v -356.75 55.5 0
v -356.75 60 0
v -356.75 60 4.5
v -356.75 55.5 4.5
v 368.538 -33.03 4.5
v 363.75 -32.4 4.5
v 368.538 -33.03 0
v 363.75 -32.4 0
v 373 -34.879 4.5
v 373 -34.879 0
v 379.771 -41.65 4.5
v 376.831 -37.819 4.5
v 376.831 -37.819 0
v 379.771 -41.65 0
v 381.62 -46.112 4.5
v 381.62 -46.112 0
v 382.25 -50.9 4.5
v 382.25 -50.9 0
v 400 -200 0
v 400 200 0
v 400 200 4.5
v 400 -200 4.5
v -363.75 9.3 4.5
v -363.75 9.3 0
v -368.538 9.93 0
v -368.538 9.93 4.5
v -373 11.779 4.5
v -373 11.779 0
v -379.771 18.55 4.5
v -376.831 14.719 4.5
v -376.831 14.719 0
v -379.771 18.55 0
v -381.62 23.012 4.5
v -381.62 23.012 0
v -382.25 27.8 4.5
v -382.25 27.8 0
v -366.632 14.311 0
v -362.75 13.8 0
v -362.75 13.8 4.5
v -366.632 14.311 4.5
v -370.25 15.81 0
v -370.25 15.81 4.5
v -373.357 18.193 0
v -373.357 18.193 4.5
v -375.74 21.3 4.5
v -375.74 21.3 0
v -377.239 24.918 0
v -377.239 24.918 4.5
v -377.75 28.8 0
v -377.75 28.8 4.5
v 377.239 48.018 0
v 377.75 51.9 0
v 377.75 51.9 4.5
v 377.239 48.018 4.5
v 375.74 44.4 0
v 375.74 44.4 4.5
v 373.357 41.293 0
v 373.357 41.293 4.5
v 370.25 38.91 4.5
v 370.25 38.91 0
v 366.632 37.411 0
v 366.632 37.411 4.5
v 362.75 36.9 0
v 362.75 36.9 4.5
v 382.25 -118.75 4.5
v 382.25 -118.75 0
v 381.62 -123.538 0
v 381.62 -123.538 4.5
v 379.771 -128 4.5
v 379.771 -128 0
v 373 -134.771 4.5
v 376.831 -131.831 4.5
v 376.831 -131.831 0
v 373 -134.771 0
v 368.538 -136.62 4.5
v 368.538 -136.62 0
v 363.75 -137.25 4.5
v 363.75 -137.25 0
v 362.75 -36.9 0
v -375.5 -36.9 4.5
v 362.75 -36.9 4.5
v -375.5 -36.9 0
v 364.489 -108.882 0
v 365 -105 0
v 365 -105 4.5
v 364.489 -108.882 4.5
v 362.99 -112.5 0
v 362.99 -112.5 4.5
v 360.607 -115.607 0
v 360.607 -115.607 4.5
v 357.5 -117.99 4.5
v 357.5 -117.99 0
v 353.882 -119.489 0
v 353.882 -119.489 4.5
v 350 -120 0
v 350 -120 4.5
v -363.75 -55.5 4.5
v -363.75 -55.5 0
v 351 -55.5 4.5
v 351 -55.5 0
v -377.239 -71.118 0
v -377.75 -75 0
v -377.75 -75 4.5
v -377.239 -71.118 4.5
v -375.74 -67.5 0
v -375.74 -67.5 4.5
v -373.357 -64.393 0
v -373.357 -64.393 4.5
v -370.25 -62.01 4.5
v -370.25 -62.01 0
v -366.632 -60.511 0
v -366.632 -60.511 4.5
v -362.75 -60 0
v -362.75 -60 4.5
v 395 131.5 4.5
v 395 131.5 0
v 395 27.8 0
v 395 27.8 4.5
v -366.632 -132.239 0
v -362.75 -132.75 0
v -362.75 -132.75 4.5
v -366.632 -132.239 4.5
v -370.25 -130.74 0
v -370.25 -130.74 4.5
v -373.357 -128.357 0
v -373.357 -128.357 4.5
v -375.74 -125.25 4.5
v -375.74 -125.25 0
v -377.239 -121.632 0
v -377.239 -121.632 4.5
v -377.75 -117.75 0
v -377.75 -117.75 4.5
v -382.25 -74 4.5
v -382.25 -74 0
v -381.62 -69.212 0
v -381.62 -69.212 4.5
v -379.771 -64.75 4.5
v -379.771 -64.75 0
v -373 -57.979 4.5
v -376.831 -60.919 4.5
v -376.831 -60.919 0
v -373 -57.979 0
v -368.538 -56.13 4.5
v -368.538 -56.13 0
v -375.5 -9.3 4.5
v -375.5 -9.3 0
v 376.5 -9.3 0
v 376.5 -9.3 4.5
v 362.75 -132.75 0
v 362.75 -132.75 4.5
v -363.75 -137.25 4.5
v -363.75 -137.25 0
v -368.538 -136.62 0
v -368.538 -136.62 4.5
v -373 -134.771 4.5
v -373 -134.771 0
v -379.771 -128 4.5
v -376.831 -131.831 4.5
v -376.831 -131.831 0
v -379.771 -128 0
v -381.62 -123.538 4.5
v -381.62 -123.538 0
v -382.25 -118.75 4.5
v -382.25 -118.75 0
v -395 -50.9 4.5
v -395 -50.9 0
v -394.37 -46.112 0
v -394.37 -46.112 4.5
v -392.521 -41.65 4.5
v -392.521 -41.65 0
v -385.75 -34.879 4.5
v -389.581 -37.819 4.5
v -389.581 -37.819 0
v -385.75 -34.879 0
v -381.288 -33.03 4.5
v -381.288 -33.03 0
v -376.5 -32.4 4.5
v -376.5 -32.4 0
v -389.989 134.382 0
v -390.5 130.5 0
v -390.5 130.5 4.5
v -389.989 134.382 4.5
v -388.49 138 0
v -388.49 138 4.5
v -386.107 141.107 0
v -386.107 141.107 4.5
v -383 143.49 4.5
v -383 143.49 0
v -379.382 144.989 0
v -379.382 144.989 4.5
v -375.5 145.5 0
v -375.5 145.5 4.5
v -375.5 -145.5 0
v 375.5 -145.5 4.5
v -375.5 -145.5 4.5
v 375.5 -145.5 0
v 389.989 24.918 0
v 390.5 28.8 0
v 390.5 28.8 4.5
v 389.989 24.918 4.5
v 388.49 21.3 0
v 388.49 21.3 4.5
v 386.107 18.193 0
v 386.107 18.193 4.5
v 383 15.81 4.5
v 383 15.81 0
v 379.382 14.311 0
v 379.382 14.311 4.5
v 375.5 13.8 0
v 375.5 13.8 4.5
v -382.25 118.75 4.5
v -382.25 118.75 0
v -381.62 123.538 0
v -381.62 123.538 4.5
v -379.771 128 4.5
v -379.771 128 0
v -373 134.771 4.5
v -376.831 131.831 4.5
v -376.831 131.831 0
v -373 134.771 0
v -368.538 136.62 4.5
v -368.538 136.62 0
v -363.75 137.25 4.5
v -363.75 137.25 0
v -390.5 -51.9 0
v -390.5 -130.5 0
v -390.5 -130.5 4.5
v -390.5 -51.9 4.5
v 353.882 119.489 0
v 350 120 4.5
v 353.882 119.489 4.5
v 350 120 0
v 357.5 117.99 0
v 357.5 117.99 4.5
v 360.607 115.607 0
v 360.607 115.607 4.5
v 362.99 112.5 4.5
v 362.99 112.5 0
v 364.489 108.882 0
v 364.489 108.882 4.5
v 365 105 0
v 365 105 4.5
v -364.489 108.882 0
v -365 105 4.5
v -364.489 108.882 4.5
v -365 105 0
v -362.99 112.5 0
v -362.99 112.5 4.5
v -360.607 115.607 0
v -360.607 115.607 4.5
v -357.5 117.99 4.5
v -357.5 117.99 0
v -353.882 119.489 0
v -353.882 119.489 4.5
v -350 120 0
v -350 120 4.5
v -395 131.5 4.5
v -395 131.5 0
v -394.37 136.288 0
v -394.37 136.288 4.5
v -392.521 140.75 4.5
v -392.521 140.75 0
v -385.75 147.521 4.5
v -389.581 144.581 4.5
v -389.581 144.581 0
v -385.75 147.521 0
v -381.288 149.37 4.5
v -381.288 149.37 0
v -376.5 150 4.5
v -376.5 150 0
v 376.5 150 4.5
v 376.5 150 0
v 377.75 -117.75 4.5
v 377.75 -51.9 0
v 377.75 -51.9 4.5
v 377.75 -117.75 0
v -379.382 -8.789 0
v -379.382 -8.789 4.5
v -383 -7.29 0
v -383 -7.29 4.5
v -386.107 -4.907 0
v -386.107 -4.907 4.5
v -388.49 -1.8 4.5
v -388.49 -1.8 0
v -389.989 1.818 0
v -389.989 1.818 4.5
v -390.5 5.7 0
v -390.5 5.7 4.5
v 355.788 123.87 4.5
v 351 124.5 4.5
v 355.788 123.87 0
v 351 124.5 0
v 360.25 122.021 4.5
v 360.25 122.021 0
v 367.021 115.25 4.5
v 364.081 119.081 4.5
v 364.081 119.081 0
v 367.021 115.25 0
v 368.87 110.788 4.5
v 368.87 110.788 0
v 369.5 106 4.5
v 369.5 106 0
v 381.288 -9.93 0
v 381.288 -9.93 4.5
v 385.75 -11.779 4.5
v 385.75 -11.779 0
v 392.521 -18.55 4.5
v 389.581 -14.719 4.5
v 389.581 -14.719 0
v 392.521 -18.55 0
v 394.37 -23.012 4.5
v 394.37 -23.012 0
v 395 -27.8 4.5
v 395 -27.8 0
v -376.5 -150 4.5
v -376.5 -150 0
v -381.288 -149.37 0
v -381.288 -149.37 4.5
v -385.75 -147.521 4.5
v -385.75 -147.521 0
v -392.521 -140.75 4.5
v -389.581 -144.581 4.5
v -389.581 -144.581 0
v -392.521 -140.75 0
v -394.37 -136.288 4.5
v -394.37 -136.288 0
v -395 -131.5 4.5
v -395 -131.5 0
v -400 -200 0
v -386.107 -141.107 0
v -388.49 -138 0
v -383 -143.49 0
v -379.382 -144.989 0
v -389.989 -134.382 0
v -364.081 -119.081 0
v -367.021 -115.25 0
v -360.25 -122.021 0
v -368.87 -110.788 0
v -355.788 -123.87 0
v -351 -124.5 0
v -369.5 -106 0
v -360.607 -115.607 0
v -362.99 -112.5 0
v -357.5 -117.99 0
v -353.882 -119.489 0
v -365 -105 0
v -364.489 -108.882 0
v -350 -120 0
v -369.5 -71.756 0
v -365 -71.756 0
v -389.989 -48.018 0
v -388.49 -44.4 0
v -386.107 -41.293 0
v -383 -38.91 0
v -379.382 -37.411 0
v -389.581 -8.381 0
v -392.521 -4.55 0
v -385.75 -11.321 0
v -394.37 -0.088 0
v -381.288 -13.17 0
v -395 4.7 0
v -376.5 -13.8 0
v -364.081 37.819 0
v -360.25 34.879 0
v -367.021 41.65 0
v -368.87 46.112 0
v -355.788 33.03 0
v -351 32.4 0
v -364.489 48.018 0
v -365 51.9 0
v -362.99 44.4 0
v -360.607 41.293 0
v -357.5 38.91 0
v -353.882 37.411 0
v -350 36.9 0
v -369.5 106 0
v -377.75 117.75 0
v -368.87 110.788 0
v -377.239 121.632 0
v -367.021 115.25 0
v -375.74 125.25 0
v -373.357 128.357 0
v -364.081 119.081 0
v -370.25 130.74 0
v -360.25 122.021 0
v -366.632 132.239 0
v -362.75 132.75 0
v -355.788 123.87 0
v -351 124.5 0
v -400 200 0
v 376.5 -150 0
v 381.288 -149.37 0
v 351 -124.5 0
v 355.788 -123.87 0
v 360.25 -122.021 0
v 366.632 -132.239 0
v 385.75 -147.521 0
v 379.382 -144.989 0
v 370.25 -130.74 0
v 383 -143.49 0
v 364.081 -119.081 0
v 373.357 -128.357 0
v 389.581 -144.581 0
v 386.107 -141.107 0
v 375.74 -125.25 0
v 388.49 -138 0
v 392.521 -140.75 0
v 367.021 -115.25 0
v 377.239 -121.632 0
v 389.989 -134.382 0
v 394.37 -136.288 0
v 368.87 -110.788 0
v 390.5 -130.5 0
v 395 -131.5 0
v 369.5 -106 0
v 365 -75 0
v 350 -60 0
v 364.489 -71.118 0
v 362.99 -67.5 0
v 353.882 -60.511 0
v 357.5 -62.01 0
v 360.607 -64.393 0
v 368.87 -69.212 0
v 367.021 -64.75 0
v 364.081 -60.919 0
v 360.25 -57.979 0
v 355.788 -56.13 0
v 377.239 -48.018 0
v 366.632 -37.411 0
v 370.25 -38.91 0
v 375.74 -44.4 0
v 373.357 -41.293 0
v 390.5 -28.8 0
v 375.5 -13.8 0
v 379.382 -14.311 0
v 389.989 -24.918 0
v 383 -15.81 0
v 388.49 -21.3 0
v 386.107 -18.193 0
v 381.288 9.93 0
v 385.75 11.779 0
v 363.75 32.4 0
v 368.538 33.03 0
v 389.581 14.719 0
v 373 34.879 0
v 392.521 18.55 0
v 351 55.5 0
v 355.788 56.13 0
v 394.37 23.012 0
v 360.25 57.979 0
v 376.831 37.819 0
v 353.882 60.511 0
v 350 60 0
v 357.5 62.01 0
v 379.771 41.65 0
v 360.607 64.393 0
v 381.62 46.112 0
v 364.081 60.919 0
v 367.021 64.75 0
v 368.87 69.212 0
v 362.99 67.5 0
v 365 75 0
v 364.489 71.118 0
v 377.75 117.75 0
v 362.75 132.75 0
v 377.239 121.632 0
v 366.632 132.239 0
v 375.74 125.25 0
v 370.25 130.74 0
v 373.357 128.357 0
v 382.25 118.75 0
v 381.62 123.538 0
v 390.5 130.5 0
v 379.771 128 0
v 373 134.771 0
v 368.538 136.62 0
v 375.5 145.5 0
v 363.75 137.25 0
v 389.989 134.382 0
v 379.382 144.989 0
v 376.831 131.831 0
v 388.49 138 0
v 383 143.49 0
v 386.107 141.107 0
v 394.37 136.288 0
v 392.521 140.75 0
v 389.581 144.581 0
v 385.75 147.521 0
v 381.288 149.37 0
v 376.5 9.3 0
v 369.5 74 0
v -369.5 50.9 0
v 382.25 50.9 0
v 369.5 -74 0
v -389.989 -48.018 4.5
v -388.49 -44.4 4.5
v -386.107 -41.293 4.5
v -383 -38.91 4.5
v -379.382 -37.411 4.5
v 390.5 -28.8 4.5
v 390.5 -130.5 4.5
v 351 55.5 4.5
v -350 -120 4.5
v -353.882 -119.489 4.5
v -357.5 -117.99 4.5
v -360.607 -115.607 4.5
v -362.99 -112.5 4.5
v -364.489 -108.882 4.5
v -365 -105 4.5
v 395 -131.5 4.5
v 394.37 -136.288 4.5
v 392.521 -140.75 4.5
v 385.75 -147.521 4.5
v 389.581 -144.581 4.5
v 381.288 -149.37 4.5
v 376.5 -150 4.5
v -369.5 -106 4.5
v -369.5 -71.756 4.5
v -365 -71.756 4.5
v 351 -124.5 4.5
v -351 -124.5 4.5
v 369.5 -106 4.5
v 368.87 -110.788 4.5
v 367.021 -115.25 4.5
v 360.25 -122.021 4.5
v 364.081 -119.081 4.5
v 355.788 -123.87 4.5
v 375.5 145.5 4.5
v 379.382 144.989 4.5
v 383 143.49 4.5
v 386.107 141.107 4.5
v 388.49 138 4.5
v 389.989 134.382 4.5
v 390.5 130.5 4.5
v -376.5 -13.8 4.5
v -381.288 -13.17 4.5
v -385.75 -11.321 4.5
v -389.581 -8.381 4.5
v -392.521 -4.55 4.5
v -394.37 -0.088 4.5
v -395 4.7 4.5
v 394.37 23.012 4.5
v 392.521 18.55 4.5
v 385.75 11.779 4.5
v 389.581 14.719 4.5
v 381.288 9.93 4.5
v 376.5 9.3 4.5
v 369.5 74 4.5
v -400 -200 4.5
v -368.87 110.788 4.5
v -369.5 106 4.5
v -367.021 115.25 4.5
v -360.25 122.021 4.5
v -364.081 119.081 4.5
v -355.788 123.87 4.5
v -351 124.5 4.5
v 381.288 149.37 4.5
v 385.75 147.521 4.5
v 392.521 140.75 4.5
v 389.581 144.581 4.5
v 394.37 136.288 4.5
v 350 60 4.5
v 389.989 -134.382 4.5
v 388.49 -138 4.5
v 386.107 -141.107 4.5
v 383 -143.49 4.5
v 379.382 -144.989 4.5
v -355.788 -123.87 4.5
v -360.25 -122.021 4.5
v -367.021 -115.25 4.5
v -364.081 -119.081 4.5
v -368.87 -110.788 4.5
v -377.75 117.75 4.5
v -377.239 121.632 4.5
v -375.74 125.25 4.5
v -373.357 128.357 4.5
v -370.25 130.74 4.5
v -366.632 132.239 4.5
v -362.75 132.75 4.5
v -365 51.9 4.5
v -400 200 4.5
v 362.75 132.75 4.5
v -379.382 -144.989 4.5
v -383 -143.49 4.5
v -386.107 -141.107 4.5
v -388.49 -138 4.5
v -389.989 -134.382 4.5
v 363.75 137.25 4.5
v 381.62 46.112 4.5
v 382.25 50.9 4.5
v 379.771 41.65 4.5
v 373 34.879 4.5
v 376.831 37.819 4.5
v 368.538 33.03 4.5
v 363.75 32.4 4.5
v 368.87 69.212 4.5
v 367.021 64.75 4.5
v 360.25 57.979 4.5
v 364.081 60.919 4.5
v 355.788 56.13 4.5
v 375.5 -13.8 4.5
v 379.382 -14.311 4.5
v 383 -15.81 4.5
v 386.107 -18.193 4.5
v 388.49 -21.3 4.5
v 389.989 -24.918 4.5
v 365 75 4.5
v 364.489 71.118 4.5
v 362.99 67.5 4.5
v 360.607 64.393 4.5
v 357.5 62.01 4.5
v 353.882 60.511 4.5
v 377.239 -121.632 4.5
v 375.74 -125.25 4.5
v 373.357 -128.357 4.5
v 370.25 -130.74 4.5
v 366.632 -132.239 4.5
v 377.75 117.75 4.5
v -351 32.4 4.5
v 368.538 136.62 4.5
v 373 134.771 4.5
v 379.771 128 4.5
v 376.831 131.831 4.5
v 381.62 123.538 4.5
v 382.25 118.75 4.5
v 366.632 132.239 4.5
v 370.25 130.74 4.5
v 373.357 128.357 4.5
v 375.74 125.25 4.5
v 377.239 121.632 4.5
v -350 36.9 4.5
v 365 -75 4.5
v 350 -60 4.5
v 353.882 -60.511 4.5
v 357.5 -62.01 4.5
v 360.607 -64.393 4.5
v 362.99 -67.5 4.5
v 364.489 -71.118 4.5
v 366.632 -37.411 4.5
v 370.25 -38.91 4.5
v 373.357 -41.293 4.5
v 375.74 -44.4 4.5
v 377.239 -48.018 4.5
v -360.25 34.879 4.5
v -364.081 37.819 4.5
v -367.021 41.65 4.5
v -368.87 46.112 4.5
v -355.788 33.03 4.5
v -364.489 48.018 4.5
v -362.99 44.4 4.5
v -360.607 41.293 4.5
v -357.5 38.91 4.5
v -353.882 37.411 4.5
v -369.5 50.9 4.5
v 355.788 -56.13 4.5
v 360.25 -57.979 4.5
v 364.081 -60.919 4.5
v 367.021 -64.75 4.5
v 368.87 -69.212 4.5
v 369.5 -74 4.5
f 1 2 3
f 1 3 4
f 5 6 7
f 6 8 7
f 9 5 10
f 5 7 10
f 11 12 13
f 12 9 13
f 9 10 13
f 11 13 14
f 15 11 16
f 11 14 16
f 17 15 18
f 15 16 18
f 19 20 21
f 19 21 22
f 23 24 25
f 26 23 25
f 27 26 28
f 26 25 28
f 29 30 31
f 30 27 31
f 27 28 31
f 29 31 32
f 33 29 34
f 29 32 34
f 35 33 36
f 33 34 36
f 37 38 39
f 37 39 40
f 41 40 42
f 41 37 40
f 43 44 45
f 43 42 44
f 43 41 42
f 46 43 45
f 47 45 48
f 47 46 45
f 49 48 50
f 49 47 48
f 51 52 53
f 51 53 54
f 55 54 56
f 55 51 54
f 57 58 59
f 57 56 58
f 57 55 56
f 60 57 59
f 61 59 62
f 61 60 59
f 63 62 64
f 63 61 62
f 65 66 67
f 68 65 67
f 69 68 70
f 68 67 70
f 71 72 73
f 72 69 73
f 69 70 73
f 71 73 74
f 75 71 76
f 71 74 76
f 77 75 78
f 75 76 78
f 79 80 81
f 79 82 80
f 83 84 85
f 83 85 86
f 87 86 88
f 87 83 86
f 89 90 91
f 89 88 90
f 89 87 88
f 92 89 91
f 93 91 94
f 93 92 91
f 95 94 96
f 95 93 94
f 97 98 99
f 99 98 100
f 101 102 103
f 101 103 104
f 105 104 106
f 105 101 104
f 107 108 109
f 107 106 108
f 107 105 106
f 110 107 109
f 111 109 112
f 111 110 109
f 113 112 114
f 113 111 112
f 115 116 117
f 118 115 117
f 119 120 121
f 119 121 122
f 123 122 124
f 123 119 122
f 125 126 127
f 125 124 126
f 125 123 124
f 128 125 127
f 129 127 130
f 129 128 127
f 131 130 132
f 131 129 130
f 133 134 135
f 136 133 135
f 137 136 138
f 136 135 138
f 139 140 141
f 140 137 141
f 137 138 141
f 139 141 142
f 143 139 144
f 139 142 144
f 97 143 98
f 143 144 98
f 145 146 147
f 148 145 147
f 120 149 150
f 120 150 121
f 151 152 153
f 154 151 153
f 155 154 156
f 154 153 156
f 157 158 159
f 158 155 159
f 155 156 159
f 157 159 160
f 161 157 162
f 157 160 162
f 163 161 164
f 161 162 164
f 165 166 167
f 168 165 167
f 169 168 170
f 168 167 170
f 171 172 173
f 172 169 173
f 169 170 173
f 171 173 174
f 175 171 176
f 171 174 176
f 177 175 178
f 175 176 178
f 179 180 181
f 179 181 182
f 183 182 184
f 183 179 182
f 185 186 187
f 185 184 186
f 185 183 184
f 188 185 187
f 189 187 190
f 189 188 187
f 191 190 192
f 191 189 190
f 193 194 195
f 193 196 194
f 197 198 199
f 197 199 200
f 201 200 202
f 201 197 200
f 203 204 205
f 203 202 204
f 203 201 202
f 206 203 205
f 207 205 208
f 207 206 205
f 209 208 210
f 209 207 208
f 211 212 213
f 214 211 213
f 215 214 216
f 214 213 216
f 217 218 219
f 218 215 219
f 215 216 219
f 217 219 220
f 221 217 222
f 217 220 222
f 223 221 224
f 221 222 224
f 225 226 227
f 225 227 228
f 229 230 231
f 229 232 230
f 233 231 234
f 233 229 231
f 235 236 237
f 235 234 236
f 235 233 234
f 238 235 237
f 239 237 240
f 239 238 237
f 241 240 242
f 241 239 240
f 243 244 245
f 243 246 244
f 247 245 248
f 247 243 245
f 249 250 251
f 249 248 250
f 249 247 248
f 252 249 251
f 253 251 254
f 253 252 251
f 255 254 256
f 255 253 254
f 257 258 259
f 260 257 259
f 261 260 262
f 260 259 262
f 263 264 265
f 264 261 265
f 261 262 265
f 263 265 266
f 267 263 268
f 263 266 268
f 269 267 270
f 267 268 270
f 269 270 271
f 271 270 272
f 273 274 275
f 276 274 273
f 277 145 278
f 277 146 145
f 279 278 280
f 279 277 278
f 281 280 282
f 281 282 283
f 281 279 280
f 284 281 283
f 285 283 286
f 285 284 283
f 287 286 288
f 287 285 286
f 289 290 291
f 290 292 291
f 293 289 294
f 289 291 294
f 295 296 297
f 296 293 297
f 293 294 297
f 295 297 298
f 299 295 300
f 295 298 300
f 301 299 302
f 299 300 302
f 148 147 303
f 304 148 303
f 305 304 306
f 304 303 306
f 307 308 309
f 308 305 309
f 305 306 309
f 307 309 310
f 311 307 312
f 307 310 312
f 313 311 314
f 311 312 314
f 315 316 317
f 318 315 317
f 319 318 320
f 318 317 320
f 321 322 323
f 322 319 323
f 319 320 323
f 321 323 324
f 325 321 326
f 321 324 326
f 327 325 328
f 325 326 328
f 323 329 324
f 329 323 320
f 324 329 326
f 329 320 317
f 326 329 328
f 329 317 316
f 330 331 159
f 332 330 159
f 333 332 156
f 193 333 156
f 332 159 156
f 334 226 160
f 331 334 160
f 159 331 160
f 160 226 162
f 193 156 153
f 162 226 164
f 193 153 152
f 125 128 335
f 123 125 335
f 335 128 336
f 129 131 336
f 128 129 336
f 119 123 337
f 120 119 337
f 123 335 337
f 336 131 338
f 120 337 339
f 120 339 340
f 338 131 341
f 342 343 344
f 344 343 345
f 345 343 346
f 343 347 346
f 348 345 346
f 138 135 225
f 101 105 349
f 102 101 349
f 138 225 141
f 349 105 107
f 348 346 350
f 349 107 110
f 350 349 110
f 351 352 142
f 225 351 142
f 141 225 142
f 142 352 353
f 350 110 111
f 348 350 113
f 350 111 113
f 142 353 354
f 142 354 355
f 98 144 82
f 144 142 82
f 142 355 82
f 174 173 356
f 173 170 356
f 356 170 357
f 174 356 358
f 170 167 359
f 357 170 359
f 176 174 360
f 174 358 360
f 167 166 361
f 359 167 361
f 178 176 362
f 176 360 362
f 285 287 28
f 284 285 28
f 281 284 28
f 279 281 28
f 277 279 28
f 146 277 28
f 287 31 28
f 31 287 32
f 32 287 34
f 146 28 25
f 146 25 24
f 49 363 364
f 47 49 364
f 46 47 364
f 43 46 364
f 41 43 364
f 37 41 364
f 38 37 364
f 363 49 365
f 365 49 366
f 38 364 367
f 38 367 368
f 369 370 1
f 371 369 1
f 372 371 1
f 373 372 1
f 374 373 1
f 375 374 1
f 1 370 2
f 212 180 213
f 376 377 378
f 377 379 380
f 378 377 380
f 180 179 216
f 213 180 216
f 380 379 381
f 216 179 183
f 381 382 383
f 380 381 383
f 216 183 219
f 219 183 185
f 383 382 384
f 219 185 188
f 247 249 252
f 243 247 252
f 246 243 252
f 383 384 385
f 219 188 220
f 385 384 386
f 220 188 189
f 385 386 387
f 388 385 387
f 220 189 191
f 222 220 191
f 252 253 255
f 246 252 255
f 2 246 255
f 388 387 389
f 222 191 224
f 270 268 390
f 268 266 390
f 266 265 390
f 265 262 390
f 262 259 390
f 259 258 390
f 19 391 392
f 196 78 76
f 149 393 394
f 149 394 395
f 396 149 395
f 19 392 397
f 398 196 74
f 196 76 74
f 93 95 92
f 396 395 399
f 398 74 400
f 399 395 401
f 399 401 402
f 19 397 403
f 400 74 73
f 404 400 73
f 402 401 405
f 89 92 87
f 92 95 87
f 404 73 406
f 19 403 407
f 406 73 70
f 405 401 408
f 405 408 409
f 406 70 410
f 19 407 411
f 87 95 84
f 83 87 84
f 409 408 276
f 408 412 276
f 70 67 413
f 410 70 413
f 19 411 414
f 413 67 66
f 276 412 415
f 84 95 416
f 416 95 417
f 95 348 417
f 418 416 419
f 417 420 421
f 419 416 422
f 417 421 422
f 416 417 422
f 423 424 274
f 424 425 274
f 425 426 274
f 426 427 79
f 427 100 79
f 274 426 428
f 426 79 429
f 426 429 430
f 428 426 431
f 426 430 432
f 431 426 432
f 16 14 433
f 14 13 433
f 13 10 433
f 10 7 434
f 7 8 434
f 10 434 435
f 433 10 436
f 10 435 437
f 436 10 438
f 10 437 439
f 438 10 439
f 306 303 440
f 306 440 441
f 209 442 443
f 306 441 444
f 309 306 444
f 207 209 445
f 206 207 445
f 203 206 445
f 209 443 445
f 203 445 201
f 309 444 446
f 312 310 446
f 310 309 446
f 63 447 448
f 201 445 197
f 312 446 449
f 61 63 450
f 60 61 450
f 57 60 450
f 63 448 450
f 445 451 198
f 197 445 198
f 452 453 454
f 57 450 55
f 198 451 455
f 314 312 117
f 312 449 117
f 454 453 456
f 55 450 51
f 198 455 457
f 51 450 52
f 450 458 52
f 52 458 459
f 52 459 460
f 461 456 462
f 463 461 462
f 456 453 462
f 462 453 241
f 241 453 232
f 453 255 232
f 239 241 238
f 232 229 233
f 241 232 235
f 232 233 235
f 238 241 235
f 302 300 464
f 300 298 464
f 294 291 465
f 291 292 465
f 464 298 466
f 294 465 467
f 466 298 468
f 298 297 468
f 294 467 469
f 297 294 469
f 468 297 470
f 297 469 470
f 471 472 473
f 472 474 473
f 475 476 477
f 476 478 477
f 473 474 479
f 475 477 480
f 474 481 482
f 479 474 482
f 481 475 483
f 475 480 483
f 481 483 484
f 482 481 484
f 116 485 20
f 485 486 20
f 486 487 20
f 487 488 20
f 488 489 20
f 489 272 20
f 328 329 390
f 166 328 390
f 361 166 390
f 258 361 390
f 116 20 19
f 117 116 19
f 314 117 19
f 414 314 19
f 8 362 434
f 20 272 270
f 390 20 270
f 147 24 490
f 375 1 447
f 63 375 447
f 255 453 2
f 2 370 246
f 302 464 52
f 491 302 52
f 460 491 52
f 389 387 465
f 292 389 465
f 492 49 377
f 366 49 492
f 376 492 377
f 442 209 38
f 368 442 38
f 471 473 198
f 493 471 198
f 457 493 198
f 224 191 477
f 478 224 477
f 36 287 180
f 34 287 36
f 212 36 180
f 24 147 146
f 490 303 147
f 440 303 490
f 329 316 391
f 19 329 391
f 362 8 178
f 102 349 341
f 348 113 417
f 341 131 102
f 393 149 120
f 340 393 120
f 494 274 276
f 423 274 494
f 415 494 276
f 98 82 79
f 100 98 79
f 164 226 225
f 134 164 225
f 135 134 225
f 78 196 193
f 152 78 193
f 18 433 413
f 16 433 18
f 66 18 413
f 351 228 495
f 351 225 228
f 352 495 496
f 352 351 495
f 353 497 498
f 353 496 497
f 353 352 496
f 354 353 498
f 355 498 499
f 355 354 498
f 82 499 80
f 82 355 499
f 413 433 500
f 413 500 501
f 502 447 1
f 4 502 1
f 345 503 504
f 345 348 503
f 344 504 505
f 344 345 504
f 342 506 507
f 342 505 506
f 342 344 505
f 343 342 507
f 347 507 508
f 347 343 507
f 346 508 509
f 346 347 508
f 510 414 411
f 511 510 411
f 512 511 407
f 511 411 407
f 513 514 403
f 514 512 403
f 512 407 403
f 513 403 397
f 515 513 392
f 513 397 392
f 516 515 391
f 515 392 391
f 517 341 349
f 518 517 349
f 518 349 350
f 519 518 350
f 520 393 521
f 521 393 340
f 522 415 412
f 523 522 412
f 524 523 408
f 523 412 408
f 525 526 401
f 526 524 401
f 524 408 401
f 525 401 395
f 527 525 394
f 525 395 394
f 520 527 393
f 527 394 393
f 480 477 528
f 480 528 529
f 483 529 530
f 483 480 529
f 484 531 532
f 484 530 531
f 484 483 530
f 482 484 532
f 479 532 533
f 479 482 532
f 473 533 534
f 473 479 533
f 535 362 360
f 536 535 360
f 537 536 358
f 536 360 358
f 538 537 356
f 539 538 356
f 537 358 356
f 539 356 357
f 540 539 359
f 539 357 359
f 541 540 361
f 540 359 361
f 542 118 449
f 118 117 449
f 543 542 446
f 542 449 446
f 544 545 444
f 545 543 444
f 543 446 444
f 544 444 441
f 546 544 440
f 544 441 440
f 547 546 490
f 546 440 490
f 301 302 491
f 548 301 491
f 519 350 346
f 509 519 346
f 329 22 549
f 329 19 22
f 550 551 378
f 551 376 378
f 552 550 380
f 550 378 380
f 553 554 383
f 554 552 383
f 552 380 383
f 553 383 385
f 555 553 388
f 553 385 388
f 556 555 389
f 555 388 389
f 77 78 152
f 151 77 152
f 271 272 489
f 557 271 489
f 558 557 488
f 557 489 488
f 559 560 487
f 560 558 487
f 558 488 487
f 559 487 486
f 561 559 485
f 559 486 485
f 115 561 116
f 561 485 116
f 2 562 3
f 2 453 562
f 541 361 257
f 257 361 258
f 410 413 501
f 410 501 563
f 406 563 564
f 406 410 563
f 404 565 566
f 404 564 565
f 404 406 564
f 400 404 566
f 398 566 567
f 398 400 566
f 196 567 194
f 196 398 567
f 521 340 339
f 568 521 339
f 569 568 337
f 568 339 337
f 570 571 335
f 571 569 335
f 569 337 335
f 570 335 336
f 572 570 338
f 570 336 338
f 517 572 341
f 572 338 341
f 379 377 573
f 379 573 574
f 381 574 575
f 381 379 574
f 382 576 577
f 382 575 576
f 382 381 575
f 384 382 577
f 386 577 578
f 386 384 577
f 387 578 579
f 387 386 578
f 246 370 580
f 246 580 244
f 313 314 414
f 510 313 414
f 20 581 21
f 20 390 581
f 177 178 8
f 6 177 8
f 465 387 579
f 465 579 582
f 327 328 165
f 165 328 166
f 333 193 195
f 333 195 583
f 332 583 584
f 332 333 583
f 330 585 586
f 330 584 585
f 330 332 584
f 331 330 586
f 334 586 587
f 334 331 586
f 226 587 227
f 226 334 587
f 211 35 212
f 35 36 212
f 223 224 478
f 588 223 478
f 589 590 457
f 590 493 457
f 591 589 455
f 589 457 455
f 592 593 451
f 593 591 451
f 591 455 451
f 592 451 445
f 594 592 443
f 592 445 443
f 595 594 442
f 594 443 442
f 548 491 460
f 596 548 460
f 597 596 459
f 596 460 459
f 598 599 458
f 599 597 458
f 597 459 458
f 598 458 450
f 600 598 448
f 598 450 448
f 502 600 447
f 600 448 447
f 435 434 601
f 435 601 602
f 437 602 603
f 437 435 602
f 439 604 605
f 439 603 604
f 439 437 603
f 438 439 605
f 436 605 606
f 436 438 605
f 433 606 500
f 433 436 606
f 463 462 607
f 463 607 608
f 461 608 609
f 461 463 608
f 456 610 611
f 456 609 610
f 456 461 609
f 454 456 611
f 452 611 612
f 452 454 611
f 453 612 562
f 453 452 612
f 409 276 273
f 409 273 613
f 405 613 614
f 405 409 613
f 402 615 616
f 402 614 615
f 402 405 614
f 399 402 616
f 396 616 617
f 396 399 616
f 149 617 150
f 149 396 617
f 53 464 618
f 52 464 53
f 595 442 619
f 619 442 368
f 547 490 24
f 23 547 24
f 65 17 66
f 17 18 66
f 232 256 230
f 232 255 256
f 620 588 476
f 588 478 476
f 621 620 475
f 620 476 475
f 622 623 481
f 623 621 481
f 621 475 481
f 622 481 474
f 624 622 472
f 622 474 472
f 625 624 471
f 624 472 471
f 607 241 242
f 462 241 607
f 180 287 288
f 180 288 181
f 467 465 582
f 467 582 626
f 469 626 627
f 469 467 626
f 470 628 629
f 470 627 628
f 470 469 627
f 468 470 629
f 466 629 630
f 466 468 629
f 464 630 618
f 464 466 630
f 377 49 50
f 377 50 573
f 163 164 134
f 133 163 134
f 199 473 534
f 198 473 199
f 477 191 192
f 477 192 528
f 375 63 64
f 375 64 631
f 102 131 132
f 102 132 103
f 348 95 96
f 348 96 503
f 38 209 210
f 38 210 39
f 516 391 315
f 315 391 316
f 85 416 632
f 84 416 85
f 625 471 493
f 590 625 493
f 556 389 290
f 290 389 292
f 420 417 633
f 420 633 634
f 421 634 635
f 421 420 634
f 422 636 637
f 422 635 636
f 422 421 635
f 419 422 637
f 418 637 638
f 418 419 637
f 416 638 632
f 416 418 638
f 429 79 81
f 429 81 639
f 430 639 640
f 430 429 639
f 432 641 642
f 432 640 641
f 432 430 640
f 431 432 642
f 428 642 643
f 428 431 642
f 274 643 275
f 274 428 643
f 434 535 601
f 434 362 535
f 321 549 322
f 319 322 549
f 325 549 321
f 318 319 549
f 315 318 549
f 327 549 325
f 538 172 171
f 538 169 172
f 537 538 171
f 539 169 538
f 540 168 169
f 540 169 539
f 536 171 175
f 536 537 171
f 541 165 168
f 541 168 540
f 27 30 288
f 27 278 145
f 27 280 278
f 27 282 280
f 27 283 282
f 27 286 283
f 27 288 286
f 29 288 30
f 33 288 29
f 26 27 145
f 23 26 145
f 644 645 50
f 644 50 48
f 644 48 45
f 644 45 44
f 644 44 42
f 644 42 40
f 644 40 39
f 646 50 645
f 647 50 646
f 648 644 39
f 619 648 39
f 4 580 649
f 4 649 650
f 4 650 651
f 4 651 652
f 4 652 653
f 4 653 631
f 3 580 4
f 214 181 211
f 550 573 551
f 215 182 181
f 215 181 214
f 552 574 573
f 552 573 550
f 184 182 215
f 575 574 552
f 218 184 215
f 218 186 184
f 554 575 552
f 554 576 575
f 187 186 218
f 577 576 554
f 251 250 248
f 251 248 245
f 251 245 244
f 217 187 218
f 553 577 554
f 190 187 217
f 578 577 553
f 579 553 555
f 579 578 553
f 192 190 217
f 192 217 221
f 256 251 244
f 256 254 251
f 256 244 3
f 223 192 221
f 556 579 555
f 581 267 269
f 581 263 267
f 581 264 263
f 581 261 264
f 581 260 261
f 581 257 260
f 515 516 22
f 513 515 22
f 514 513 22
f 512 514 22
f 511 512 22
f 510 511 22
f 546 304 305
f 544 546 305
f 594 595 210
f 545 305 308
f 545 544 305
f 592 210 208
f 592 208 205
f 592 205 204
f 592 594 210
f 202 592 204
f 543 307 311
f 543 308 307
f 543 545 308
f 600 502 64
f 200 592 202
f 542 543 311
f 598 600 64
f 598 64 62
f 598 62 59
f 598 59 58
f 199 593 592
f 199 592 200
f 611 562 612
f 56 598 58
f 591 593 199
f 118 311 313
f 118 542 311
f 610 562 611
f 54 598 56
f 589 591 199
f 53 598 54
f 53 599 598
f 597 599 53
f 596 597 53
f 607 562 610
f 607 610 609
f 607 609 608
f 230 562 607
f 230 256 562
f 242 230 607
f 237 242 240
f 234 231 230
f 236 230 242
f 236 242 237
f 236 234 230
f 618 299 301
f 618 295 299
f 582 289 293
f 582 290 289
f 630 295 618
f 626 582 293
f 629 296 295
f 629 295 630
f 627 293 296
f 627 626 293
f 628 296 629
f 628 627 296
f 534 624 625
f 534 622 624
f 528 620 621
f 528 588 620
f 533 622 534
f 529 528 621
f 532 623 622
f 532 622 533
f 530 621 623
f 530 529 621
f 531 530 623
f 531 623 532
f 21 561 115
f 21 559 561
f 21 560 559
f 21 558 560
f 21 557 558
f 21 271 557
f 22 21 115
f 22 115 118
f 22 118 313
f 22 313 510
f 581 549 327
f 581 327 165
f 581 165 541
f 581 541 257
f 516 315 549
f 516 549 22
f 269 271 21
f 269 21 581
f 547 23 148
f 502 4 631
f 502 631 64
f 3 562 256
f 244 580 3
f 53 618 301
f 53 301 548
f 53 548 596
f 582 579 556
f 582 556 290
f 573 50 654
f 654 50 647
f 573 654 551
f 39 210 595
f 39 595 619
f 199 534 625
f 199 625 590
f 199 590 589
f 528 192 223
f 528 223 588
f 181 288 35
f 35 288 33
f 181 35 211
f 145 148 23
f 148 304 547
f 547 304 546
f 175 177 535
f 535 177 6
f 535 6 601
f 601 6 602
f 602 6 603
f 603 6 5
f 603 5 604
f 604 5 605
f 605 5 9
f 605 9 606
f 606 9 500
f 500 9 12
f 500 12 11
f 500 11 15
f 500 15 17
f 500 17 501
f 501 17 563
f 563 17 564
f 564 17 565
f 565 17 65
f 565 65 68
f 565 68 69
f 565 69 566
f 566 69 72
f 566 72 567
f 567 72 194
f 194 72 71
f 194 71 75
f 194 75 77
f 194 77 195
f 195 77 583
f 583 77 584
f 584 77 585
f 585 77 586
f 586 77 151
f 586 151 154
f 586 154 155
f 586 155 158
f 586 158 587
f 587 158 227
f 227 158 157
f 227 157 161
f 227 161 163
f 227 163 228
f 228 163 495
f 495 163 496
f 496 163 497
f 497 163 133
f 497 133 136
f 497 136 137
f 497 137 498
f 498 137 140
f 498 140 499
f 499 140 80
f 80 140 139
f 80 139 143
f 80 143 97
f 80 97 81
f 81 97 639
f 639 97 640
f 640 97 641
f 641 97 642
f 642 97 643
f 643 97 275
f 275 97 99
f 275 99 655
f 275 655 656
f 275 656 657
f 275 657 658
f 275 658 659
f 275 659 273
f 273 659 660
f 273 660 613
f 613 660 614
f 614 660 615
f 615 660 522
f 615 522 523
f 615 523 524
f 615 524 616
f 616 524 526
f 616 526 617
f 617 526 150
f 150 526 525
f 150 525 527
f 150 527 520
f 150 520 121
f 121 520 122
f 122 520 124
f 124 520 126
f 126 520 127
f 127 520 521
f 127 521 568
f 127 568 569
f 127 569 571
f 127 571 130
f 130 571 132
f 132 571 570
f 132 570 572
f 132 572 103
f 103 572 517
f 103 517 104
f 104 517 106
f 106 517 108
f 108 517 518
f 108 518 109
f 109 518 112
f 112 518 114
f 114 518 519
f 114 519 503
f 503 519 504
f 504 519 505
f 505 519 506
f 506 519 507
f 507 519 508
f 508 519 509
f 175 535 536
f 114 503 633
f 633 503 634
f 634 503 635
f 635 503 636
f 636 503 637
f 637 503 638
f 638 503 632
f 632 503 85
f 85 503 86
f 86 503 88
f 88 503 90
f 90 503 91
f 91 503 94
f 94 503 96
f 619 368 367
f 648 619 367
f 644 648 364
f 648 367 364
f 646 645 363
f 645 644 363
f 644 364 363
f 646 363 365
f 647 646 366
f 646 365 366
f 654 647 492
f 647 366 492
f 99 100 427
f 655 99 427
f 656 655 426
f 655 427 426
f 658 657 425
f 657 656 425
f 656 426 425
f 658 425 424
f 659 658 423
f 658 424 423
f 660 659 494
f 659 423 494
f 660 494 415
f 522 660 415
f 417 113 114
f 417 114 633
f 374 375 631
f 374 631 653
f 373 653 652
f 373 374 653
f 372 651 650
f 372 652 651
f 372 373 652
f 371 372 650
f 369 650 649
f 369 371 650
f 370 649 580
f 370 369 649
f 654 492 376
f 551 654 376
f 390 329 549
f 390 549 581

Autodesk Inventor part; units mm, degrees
ref_plane "YZ Plane" through (0, 0, 0) normal (1, 0, 0) x (0, 1, 0)
ref_plane "XZ Plane" through (0, 0, 0) normal (0, 1, 0) x (-1, 0, 0)
sketch "layer_layout_sketch" plane through (0, 0, 0) normal (0, 0, 1) x (1, 0, 0)
  line L0 (-400, 200) -> (400, 200)
  line L1 (400, 200) -> (400, -200)
  line L2 (400, -200) -> (-400, -200)
  line L3 (-400, -200) -> (-400, 200)
  line L4 (0, 200) -> (0, -200) construction
  point P0 (0, 0)
  point P1 (0, 0)
  dimension "d116" = 400
  dimension "d117" = 800
sketch "coil_layer_sketch_lower" plane through (0, 0, 0) normal (0, 0, 1) x (1, 0, 0)
  line L0 (0, -9.3) -> (376.5, -9.3)
  line L1 (395, -27.8) -> (395, -131.5)
  line L2 (376.5, -150) -> (-376.5, -150)
  line L3 (-395, -131.5) -> (-395, -50.9)
  line L4 (0, -9.3) -> (0, -13.8)
  line L5 (0, -13.8) -> (375.5, -13.8)
  line L6 (390.5, -28.8) -> (390.5, -130.5)
  line L7 (375.5, -145.5) -> (-375.5, -145.5)
  line L8 (-376.5, -32.4) -> (363.75, -32.4)
  line L9 (382.25, -50.9) -> (382.25, -118.75)
  line L10 (363.75, -137.25) -> (-363.75, -137.25)
  line L11 (-390.5, -130.5) -> (-390.5, -51.9)
  line L12 (-375.5, -36.9) -> (362.75, -36.9)
  line L13 (377.75, -51.9) -> (377.75, -117.75)
  line L14 (362.75, -132.75) -> (-362.75, -132.75)
  line L15 (-377.75, -117.75) -> (-377.75, -75)
  line L16 (-382.25, -118.75) -> (-382.25, -74)
  line L17 (-363.75, -55.5) -> (351, -55.5)
  line L18 (369.5, -74) -> (369.5, -106)
  line L19 (-362.75, -60) -> (350, -60)
  line L20 (365, -75) -> (365, -105)
  line L21 (-558.3641, 0) -> (558.3641, 0) projected
  line L22 (350, -120) -> (-350, -120)
  line L23 (351, -124.5) -> (-351, -124.5)
  line L24 (-369.5, -106) -> (-369.5, -71.7563)
  line L25 (-369.5, -71.7563) -> (-365, -71.7563)
  line L26 (-365, -71.7563) -> (-365, -105)
  arc A0 (395, -27.8) -> (376.5, -9.3) centre (376.5, -27.8) ccw
  arc A1 (382.25, -50.9) -> (363.75, -32.4) centre (363.75, -50.9) ccw
  arc A2 (369.5, -74) -> (351, -55.5) centre (351, -74) ccw
  arc A3 (351, -124.5) -> (369.5, -106) centre (351, -106) ccw
  arc A4 (363.75, -137.25) -> (382.25, -118.75) centre (363.75, -118.75) ccw
  arc A5 (376.5, -150) -> (395, -131.5) centre (376.5, -131.5) ccw
  arc A6 (-395, -131.5) -> (-376.5, -150) centre (-376.5, -131.5) ccw
  arc A7 (-382.25, -118.75) -> (-363.75, -137.25) centre (-363.75, -118.75) ccw
  arc A8 (-369.5, -106) -> (-351, -124.5) centre (-351, -106) ccw
  arc A9 (-376.5, -32.4) -> (-395, -50.9) centre (-376.5, -50.9) ccw
  arc A10 (-363.75, -55.5) -> (-382.25, -74) centre (-363.75, -74) ccw
  arc A11 (-375.5, -36.9) -> (-390.5, -51.9) centre (-375.5, -51.9) ccw
  arc A12 (-362.75, -60) -> (-377.75, -75) centre (-362.75, -75) ccw
  arc A13 (-390.5, -130.5) -> (-375.5, -145.5) centre (-375.5, -130.5) ccw
  arc A14 (-377.75, -117.75) -> (-362.75, -132.75) centre (-362.75, -117.75) ccw
  arc A15 (-365, -105) -> (-350, -120) centre (-350, -105) ccw
  arc A16 (350, -120) -> (365, -105) centre (350, -105) ccw
  arc A17 (362.75, -132.75) -> (377.75, -117.75) centre (362.75, -117.75) ccw
  arc A18 (375.5, -145.5) -> (390.5, -130.5) centre (375.5, -130.5) ccw
  arc A19 (377.75, -51.9) -> (362.75, -36.9) centre (362.75, -51.9) ccw
  arc A20 (390.5, -28.8) -> (375.5, -13.8) centre (375.5, -28.8) ccw
  arc A21 (365, -75) -> (350, -60) centre (350, -75) ccw
  point P0 (0, 0)
  point P1 (0, 0)
  point P2 (368.0934, -60)
  point P3 (370, -61.9066)
  point P4 (0, -150)
  dimension "d1" = 4.5
  dimension "d2" = 4.5
  dimension "d3" = 4.5
  dimension "d4" = 9.3
  dimension "d5" = 790
  dimension "d6" = 395
  dimension "d7" = 4.5
  dimension "d8" = 4.5
  dimension "d9" = 8.25
  dimension "d10" = 4.5
  dimension "d11" = 18.6
  dimension "d12" = 4.5
  dimension "d13" = 8.25
  dimension "d14" = 4.5
  dimension "d15" = 4.5
  dimension "d16" = 4.5
  dimension "d17" = 8.25
  dimension "d19" = 18.6
  dimension "d20" = 8.25
  dimension "d82" = 150
  dimension "d88" = 4.5
  dimension "d89" = 8.25
  dimension "d96" = 4.5
  dimension "d97" = 8.25
  dimension "d98" = 18.5
  dimension "d99" = 15
  dimension "d109" = 15
sketch "coil_layer_sketch_upper" plane through (0, 0, 0) normal (0, 0, 1) x (1, 0, 0)
  line L0 (0, -13.8) -> (-376.5, -13.8)
  line L1 (-395, 4.7) -> (-395, 131.5)
  line L2 (-376.5, 150) -> (376.5, 150)
  line L3 (395, 131.5) -> (395, 27.8)
  line L4 (0, -9.3) -> (-375.5, -9.3)
  line L5 (-390.5, 5.7) -> (-390.5, 130.5)
  line L6 (-375.5, 145.5) -> (375.5, 145.5)
  line L7 (390.5, 130.5) -> (390.5, 28.8)
  line L8 (375.5, 13.8) -> (-362.75, 13.8)
  line L9 (-377.75, 28.8) -> (-377.75, 117.75)
  line L10 (376.5, 9.3) -> (-363.75, 9.3)
  line L11 (-382.25, 27.8) -> (-382.25, 118.75)
  line L12 (-362.75, 132.75) -> (362.75, 132.75)
  line L13 (-363.75, 137.25) -> (363.75, 137.25)
  line L14 (377.75, 117.75) -> (377.75, 51.9)
  line L15 (362.75, 36.9) -> (-350, 36.9)
  line L16 (382.25, 118.75) -> (382.25, 50.9)
  line L17 (363.75, 32.4) -> (-351, 32.4)
  line L18 (-365, 51.9) -> (-365, 105)
  line L19 (-350, 120) -> (350, 120)
  line L20 (365, 105) -> (365, 75)
  line L21 (350, 60) -> (-356.75, 60)
  line L22 (-369.5, 50.9) -> (-369.5, 106)
  line L23 (-351, 124.5) -> (351, 124.5)
  line L24 (369.5, 106) -> (369.5, 74)
  line L25 (351, 55.5) -> (-356.75, 55.5)
  line L26 (-356.75, 60) -> (-356.75, 55.5)
  line L27 (-700, 0) -> (700, 0)
  line L28 (-980, 0) -> (980, 0) projected
  line L29 (0, -13.8) -> (0, -9.3)
  line L30 (0, -51.9241) -> (0, 188.1241) projected
  arc A0 (365, 105) -> (350, 120) centre (350, 105) ccw
  arc A1 (350, 60) -> (365, 75) centre (350, 75) ccw
  arc A2 (377.75, 117.75) -> (362.75, 132.75) centre (362.75, 117.75) ccw
  arc A3 (362.75, 36.9) -> (377.75, 51.9) centre (362.75, 51.9) ccw
  arc A4 (390.5, 130.5) -> (375.5, 145.5) centre (375.5, 130.5) ccw
  arc A5 (375.5, 13.8) -> (390.5, 28.8) centre (375.5, 28.8) ccw
  arc A6 (-350, 120) -> (-365, 105) centre (-350, 105) ccw
  arc A7 (-365, 51.9) -> (-350, 36.9) centre (-350, 51.9) ccw
  arc A8 (-377.75, 28.8) -> (-362.75, 13.8) centre (-362.75, 28.8) ccw
  arc A9 (-390.5, 5.7) -> (-375.5, -9.3) centre (-375.5, 5.7) ccw
  arc A10 (-362.75, 132.75) -> (-377.75, 117.75) centre (-362.75, 117.75) ccw
  arc A11 (-375.5, 145.5) -> (-390.5, 130.5) centre (-375.5, 130.5) ccw
  arc A12 (-376.5, 150) -> (-395, 131.5) centre (-376.5, 131.5) ccw
  arc A13 (-363.75, 137.25) -> (-382.25, 118.75) centre (-363.75, 118.75) ccw
  arc A14 (-351, 124.5) -> (-369.5, 106) centre (-351, 106) ccw
  arc A15 (-369.5, 50.9) -> (-351, 32.4) centre (-351, 50.9) ccw
  arc A16 (-382.25, 27.8) -> (-363.75, 9.3) centre (-363.75, 27.8) ccw
  arc A17 (-395, 4.7) -> (-376.5, -13.8) centre (-376.5, 4.7) ccw
  arc A18 (351, 55.5) -> (369.5, 74) centre (351, 74) ccw
  arc A19 (363.75, 32.4) -> (382.25, 50.9) centre (363.75, 50.9) ccw
  arc A20 (376.5, 9.3) -> (395, 27.8) centre (376.5, 27.8) ccw
  arc A21 (395, 131.5) -> (376.5, 150) centre (376.5, 131.5) ccw
  arc A22 (382.25, 118.75) -> (363.75, 137.25) centre (363.75, 118.75) ccw
  arc A23 (369.5, 106) -> (351, 124.5) centre (351, 106) ccw
  point P0 (0, 0)
  point P1 (395, 9.3)
  point P2 (-382.25, 9.3)
  point P3 (0, 150)
  point P4 (-700, 0)
  point P5 (700, 0)
  point P6 (0, 150)
  dimension "d58" = 4.5
  dimension "d59" = 4.5
  dimension "d60" = 4.5
  dimension "d61" = 8.25
  dimension "d62" = 8.25
  dimension "d64" = 4.5
  dimension "d65" = 4.5
  dimension "d66" = 4.5
  dimension "d67" = 8.25
  dimension "d69" = 18.6
  dimension "d70" = 4.5
  dimension "d71" = 4.5
  dimension "d72" = 18.6
  dimension "d73" = 8.25
  dimension "d74" = 8.25
  dimension "d75" = 4.5
  dimension "d77" = 18.6
  dimension "d78" = 4.5
  dimension "d79" = 4.5
  dimension "d80" = 4.5
  dimension "d83" = 150
  dimension "d87" = 8.25
  dimension "d91" = 4.5
  dimension "d92" = 9.3
  dimension "d93" = 790
  dimension "d100" = 15
  dimension "d101" = 18.5
  dimension "d102" = 8.25
extrude "layer_sheet Extrude" add sketch "layer_layout_sketch" along normal blind 4.5
extrude "wire_holes_upper Cut" cut sketch "coil_layer_sketch_upper" along normal blind 4.5 contours L0 A17 L27 A9 L4 L29 | A17 L1 A12 L2 L30 L6 A11 L5 A9 L27 | L30 L8 A5 L7 A4 L6 L2 A21 L3 A20 L10 | L10 A16 L11 A13 L13 L30 L12 A10 L9 A8 L8 | L30 L15 A3 L14 A2 L12 L13 A22 L16 A19 L17 | L17 A15 L22 A14 L23 L30 L19 A6 L18 A7 L15 | L30 L21 A1 L20 A0 L19 L23 A23 L24 A18 L25 | L25 L26 L21 L30
extrude "wire_holes_lower Cut" cut sketch "coil_layer_sketch_lower" along normal blind 4.5
equation "\"d1\" = wire_diameter"
equation "\"d2\" = wire_diameter"
equation "\"d3\" = wire_diameter"
equation "\"d4\" = 0.5 * distance_between_wires"
equation "\"d6\" = 0.5 * track_length"
equation "\"d7\" = wire_diameter"
equation "\"d8\" = wire_diameter"
equation "\"d9\" = distance_between_wires_edge"
equation "\"d10\" = wire_diameter"
equation "\"d11\" = distance_between_wires"
equation "\"d12\" = wire_diameter"
equation "\"d13\" = distance_between_wires_edge"
equation "\"d14\" = wire_diameter"
equation "\"d15\" = wire_diameter"
equation "\"d16\" = wire_diameter"
equation "\"d17\" = distance_between_wires_edge"
equation "\"d19\" = distance_between_wires"
equation "\"d20\" = distance_between_wires_edge"
equation "\"d82\" = 0.5 * track_width"
equation "\"d58\" = wire_diameter"
equation "\"d59\" = wire_diameter"
equation "\"d60\" = wire_diameter"
equation "\"d61\" = distance_between_wires_edge"
equation "\"d62\" = distance_between_wires_edge"
equation "\"d64\" = wire_diameter"
equation "\"d65\" = wire_diameter"
equation "\"d66\" = wire_diameter"
equation "\"d67\" = distance_between_wires_edge"
equation "\"d69\" = distance_between_wires"
equation "\"d70\" = wire_diameter"
equation "\"d71\" = wire_diameter"
equation "\"d72\" = distance_between_wires"
equation "\"d73\" = distance_between_wires_edge"
equation "\"d74\" = distance_between_wires_edge"
equation "\"d75\" = wire_diameter"
equation "\"d77\" = distance_between_wires"
equation "\"d78\" = wire_diameter"
equation "\"d79\" = wire_diameter"
equation "\"d80\" = wire_diameter"
equation "\"d83\" = 0.5 * track_width"
equation "\"wire_diameter\" = 4.5"
equation "\"distance_between_wires\" = -1.2 * wire_diameter + 0.2 * parameter_6"
equation "\"distance_between_wires_edge\" = 8.25"
equation "\"bend_radius_inner\" = 15"
equation "\"bend_radius_outer\" = 18.5"
equation "\"track_width\" = 300"
equation "\"parameter_6\" = 120"
equation "\"track_length\" = 790"
properties part number "primary_coil_0R2"
